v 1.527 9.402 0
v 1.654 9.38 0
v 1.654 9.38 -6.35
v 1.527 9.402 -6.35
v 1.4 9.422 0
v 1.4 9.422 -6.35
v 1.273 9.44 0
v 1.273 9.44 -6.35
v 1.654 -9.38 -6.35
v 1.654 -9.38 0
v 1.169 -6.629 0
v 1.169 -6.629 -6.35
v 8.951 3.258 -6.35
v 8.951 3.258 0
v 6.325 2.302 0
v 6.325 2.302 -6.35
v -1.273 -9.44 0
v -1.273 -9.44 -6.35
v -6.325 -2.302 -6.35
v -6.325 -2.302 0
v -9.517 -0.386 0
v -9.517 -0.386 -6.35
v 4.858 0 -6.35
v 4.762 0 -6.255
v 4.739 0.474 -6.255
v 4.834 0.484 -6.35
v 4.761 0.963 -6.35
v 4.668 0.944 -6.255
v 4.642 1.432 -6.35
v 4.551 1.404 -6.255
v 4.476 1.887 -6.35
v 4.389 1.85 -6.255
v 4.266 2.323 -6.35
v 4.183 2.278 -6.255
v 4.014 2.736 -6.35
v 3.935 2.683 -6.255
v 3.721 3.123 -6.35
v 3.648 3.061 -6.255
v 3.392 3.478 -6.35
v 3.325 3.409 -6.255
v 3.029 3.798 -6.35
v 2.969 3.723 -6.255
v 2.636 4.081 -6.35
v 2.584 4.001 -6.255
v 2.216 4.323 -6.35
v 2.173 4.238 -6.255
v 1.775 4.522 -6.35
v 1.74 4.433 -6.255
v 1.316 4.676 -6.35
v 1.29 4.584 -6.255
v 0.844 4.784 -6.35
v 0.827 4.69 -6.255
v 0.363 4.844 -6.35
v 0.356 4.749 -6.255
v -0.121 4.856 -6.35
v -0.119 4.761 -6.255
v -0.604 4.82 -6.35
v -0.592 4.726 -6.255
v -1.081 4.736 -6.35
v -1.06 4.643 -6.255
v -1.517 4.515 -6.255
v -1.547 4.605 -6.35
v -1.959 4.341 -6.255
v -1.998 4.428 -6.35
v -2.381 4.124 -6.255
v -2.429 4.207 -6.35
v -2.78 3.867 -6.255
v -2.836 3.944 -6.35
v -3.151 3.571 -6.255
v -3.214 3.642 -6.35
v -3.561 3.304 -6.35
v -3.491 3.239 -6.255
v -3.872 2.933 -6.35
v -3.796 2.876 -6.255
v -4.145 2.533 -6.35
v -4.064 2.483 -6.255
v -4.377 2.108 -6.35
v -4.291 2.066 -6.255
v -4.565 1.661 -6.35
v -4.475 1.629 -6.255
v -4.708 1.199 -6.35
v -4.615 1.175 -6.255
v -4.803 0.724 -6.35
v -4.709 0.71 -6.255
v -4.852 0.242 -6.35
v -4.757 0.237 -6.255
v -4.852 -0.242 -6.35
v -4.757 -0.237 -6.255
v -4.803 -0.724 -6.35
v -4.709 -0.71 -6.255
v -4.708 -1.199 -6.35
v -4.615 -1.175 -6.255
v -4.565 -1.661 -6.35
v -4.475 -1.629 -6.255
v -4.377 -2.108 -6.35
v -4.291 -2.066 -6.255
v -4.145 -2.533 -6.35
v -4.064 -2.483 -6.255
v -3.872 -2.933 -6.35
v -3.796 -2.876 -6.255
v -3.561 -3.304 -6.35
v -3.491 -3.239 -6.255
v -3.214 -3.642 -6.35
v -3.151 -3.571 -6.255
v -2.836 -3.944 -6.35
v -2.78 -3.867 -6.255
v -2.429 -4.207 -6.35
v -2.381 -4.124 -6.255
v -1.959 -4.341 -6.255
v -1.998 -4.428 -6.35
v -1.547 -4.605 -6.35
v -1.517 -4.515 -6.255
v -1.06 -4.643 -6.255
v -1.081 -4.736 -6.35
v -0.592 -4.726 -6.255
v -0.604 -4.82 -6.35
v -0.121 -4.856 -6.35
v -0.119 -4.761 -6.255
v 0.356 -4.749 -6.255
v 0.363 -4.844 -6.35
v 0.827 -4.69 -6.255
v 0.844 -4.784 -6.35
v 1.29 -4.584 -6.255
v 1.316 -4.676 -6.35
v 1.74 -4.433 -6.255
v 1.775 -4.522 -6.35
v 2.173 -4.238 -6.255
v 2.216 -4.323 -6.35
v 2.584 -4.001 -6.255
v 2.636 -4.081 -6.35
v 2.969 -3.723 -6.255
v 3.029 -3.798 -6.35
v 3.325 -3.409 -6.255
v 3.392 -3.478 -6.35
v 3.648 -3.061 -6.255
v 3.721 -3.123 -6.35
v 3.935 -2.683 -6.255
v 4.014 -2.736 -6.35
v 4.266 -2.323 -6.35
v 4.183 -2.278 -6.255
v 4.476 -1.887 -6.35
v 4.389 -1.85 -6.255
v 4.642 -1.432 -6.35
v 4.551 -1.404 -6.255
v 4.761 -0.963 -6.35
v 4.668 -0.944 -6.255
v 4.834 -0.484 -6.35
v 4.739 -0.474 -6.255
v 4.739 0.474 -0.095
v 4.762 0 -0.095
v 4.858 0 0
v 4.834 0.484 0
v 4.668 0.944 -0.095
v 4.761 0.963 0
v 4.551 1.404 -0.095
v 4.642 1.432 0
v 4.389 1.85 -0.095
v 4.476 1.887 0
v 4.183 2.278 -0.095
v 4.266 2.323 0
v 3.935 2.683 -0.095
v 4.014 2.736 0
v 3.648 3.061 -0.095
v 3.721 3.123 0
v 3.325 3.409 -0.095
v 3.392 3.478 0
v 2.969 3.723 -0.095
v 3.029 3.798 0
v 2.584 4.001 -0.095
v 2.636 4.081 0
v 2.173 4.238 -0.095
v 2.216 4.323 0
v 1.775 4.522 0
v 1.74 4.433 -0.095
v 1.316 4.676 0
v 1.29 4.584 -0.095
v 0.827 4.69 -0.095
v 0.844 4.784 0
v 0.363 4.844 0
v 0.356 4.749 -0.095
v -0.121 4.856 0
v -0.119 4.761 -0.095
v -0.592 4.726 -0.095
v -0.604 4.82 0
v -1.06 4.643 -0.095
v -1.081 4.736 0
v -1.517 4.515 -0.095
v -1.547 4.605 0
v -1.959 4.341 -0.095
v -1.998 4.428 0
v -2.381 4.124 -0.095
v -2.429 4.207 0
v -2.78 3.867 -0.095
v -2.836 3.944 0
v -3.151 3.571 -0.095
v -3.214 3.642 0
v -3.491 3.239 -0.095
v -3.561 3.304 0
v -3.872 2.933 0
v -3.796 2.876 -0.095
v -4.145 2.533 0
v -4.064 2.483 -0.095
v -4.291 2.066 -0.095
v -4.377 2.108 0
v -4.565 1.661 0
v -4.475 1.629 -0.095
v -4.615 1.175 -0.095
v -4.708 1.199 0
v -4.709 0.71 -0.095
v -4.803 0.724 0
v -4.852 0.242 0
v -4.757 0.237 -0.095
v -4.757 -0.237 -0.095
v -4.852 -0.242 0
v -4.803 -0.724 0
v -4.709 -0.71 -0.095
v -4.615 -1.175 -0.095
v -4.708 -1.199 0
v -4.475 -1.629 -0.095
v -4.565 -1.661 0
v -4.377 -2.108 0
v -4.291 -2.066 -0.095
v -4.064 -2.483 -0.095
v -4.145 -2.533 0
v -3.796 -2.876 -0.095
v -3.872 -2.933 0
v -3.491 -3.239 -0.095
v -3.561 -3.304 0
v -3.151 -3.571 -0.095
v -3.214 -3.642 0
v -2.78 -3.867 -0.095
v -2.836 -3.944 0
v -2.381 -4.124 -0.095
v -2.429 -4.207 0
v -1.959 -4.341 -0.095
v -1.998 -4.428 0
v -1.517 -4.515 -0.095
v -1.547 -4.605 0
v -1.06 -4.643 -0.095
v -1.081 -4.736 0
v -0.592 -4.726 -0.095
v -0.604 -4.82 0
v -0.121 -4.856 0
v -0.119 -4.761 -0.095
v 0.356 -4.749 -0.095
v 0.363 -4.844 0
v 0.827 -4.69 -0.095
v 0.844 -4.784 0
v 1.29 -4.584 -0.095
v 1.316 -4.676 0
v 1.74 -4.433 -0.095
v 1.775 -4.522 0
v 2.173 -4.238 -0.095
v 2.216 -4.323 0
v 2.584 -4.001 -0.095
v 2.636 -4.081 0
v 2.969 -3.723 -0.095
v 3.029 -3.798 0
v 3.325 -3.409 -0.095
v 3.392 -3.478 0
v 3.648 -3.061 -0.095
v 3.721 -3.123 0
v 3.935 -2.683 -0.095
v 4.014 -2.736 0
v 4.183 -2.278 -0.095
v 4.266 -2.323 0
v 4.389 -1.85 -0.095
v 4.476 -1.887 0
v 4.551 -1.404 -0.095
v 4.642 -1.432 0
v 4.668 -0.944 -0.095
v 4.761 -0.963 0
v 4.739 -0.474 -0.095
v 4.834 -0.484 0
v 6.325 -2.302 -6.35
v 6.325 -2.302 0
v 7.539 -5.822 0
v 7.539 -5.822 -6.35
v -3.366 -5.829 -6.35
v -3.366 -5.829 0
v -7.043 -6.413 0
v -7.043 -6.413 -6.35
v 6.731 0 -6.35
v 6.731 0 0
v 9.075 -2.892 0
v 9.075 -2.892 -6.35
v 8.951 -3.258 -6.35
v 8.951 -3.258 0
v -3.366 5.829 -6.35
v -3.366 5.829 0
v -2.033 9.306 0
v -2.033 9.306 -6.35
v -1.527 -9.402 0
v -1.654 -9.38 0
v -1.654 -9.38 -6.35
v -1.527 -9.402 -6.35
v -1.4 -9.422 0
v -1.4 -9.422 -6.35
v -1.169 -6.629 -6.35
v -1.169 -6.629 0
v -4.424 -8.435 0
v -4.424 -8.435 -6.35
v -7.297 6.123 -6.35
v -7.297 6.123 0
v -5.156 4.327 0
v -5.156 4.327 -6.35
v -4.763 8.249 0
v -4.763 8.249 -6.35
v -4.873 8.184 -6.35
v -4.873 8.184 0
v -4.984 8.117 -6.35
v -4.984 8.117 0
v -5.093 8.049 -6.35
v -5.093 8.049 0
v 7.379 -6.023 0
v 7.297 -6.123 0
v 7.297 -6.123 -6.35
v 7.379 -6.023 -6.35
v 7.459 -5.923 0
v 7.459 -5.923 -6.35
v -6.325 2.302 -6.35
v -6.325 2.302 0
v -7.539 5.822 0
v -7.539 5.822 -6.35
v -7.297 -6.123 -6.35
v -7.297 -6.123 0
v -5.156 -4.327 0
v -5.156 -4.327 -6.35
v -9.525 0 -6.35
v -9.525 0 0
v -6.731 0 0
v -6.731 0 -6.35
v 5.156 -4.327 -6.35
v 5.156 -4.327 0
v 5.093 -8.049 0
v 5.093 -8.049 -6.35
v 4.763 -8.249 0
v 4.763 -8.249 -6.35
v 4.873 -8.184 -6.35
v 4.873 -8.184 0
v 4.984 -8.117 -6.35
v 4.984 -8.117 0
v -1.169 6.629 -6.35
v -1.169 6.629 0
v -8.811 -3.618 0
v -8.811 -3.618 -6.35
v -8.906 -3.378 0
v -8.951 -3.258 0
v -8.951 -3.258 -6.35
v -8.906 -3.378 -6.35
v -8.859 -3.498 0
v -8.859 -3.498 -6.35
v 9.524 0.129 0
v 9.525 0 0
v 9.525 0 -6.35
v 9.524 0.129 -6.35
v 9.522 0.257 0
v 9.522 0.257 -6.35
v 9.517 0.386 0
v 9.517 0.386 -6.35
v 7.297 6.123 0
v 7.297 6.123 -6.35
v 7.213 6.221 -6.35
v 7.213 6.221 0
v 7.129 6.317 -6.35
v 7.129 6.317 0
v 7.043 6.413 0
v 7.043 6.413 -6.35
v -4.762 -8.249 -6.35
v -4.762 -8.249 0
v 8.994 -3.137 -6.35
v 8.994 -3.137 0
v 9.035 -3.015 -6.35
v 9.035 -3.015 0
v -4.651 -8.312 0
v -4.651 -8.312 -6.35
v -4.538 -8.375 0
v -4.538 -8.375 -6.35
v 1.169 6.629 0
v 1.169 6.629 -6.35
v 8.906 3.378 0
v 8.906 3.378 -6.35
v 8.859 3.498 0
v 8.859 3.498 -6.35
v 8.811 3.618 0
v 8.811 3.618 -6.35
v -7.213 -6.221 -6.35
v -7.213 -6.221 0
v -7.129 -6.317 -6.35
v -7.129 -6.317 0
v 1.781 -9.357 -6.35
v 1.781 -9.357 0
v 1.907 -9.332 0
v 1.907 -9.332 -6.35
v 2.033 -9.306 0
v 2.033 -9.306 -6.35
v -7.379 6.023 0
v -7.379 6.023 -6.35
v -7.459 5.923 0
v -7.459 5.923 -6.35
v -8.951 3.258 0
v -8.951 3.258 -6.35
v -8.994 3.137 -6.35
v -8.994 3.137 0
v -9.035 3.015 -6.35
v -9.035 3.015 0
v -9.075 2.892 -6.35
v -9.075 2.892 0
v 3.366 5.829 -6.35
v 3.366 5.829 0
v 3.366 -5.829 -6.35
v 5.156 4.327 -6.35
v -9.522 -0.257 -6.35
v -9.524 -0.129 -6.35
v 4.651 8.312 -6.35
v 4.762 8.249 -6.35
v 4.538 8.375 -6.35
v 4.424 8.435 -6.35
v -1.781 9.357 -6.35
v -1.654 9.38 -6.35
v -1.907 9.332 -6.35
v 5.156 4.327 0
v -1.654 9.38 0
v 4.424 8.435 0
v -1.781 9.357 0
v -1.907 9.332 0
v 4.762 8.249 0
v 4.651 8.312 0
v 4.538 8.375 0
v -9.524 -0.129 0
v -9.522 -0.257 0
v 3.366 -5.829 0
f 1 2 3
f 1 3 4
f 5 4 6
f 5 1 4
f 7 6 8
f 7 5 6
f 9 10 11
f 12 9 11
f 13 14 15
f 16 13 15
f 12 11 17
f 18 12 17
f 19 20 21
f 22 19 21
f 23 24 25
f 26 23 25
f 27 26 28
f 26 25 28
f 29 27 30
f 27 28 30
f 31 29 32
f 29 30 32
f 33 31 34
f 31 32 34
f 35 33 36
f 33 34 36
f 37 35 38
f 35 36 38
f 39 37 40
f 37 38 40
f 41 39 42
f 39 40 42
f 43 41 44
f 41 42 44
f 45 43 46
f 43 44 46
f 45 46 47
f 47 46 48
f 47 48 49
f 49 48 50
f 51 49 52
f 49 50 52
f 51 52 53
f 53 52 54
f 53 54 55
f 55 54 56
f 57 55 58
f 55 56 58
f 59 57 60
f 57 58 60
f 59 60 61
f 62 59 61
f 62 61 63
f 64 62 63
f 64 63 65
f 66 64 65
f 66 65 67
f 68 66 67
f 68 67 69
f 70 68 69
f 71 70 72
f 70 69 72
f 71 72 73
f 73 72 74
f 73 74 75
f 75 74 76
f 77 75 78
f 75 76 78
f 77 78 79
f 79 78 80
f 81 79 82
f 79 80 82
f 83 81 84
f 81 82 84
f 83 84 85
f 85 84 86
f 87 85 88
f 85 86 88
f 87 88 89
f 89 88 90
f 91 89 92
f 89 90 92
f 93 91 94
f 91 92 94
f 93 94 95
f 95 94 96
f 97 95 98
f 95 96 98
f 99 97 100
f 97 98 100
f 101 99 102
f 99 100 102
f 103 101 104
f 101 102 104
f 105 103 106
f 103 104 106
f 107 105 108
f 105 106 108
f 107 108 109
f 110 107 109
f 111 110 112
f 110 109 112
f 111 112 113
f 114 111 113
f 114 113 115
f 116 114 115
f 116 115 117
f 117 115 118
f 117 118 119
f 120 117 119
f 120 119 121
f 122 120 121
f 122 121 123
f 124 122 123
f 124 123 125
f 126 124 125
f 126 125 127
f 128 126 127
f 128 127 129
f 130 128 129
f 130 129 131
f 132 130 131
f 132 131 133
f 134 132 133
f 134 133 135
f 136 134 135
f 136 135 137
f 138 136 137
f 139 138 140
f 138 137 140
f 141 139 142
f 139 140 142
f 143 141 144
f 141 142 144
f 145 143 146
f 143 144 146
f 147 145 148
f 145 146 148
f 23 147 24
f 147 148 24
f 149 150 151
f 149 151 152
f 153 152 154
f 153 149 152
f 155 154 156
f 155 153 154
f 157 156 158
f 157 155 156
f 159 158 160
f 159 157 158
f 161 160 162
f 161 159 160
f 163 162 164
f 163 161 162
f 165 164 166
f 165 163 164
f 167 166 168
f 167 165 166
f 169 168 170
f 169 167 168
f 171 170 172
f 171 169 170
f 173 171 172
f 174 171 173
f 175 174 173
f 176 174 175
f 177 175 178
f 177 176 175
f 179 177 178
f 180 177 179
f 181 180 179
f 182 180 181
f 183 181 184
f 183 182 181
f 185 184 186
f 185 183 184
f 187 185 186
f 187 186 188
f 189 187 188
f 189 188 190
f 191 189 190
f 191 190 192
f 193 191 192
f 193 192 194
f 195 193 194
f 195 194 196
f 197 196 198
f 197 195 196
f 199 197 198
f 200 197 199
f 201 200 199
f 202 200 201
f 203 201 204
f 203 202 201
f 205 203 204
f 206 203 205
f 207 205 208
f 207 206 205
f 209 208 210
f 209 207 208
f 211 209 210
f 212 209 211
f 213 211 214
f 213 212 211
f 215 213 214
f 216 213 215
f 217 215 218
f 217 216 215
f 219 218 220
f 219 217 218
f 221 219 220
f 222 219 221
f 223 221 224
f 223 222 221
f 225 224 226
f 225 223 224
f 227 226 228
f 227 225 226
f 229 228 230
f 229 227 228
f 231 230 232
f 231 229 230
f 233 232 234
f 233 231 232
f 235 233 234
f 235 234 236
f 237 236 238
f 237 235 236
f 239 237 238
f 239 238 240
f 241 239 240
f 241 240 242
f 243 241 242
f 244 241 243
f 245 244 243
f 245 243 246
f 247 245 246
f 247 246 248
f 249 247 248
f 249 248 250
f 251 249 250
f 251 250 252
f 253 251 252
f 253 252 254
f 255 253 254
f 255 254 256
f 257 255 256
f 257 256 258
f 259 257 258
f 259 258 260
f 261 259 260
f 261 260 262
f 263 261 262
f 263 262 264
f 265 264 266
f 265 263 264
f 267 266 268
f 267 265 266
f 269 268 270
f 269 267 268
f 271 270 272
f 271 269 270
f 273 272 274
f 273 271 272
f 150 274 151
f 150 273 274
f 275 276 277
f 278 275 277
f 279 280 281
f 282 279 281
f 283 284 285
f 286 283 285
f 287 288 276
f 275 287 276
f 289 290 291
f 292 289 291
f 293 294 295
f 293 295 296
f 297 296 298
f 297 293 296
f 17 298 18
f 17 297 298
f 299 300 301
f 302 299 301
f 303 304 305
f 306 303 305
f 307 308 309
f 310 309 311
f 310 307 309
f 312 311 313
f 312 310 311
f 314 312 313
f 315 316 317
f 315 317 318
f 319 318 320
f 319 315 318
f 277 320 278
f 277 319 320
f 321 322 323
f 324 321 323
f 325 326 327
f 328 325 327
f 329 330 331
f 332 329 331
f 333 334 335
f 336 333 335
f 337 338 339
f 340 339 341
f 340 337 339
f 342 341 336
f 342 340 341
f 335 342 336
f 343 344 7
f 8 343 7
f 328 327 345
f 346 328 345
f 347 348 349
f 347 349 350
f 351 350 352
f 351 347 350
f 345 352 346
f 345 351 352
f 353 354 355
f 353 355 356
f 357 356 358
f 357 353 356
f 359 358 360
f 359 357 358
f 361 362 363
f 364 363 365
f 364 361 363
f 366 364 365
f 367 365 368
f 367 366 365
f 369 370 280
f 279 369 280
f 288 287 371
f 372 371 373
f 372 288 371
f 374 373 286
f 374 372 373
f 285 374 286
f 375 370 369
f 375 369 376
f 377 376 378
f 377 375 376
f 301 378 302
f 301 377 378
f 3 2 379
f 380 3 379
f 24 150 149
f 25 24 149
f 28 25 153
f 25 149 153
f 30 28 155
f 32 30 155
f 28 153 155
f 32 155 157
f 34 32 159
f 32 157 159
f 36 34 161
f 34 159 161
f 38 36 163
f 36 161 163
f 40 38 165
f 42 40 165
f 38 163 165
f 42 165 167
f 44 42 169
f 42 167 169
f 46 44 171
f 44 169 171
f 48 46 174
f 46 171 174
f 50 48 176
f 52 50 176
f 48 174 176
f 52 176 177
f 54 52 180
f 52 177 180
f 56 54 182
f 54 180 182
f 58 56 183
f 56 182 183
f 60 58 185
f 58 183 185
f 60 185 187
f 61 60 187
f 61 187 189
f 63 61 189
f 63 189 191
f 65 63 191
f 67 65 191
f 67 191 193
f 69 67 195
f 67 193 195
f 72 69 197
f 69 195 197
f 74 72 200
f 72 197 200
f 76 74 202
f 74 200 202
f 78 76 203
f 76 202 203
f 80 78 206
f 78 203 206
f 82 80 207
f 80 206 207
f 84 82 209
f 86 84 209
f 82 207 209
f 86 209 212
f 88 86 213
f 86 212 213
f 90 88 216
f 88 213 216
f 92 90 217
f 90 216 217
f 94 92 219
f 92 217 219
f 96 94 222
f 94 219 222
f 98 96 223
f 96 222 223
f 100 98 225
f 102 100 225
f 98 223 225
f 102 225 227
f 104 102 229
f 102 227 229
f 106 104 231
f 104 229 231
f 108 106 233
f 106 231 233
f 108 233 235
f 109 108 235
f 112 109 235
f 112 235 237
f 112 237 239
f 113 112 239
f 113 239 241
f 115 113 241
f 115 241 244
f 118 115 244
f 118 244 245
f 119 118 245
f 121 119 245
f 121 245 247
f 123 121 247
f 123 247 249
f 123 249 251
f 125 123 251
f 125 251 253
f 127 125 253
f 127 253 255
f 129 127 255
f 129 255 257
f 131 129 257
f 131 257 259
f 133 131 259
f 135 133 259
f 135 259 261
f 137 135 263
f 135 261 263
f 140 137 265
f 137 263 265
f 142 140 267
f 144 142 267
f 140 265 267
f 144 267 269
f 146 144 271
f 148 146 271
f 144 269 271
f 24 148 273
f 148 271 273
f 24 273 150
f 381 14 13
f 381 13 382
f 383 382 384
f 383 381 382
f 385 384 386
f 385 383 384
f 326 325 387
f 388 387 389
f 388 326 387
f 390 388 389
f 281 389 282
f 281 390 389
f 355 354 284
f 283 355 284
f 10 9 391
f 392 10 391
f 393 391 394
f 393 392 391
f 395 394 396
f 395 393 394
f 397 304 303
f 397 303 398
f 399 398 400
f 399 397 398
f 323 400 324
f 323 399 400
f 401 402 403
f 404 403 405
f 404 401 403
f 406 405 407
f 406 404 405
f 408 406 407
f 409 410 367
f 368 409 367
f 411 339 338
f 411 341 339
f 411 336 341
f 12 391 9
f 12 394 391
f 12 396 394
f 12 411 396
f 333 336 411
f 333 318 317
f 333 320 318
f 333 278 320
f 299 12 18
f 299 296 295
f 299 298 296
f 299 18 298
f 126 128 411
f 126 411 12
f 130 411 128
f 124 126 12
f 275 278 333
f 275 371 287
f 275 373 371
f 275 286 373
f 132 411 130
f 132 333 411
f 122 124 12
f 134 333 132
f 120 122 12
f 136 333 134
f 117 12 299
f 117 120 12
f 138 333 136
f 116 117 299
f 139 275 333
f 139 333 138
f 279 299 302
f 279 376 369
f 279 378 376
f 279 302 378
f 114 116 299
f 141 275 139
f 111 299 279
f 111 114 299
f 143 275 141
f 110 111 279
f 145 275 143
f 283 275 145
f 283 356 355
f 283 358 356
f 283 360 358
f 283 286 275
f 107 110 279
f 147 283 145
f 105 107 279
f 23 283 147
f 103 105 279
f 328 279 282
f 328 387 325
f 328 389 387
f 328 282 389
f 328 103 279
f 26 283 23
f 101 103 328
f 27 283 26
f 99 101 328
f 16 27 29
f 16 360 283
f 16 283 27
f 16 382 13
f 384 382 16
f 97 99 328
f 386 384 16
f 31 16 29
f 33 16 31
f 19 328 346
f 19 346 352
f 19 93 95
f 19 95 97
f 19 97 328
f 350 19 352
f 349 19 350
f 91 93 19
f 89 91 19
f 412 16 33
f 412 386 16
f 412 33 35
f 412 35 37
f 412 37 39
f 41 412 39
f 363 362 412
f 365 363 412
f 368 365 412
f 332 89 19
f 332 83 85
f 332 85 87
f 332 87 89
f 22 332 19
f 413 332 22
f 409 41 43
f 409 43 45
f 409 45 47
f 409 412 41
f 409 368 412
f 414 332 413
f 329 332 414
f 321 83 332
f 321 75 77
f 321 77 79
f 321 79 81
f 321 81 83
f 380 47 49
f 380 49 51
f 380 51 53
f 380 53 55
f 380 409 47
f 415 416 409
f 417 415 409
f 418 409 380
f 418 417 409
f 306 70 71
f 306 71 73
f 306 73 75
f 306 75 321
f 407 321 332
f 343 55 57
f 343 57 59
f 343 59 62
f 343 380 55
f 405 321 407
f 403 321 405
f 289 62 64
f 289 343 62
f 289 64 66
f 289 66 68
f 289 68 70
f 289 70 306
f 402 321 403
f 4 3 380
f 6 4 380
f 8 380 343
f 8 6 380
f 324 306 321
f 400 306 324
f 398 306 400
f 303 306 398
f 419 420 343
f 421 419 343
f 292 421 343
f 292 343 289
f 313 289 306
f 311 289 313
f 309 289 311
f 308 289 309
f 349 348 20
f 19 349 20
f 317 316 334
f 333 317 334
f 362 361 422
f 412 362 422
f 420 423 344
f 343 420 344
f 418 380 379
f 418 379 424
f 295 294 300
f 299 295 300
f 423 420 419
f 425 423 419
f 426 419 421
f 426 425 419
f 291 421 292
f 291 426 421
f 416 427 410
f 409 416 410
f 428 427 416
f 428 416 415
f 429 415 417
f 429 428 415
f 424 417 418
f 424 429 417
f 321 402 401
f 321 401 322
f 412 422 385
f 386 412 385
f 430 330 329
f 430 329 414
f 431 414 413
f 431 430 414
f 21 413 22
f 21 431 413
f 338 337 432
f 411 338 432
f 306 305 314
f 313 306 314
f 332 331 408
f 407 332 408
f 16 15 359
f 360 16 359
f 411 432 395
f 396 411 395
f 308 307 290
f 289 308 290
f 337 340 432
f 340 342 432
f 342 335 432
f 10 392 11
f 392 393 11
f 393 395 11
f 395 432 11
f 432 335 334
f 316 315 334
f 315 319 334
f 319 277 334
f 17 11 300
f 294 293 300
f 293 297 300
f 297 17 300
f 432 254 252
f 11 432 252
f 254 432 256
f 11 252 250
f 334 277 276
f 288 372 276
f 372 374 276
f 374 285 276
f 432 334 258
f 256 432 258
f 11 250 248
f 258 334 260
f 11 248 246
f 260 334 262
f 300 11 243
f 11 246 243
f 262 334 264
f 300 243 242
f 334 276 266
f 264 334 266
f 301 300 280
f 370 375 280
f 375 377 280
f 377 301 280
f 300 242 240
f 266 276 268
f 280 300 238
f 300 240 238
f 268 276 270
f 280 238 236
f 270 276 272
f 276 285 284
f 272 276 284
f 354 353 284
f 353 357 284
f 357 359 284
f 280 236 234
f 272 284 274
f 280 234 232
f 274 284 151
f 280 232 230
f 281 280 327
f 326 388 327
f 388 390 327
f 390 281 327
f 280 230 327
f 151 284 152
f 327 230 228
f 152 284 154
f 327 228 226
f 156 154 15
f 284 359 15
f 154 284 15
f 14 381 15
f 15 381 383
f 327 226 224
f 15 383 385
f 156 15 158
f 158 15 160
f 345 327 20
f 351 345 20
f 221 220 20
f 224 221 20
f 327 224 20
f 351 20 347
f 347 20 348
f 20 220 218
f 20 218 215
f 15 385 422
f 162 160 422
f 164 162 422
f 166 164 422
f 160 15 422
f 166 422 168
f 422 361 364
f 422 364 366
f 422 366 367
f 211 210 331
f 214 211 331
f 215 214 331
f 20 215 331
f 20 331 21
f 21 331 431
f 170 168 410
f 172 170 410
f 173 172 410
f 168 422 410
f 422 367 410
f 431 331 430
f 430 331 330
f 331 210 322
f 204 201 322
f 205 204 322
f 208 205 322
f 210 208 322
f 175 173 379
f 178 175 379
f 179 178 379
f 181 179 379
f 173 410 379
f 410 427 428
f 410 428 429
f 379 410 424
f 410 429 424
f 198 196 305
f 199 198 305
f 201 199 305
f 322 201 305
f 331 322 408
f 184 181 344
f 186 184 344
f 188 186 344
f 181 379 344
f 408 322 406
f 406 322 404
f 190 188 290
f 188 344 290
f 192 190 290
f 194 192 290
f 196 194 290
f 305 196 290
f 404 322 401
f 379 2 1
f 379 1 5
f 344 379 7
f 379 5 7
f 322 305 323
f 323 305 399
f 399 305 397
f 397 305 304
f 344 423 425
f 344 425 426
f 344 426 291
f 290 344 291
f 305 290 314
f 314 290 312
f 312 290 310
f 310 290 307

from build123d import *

# Parameters (mm, degrees)
SKETCH1_R               = 6.731
SKETCH1_R_2             = 4.7625
BOSS_EXTRUDE1_DEPTH     = 6.35
BOSS_EXTRUDE2_DEPTH     = 6.35
CIRPATTERN1_COUNT       = 18
CHAMFER1_SIZE           = 0.09525
SKETCH3_R               = 314.325
SKETCH3_R_2             = 9.525
CUT_EXTRUDE_THIN1_DEPTH = 16.60964661


with BuildPart() as part:
    # Sketch1 → Boss-Extrude1 (new body)
    with BuildSketch(Plane.XY):
        Circle(SKETCH1_R)
        Circle(SKETCH1_R_2, mode=Mode.SUBTRACT)
    extrude(amount=-BOSS_EXTRUDE1_DEPTH)

    # Sketch2 → Boss-Extrude2 (add)
    with BuildSketch(Plane.XY):
        with BuildLine():
            Line((-1.168825884, 6.628740986), (1.764265485, 10.005646771))
            Line((1.764265485, 10.005646771), (1.168825884, 6.628740986))
            ThreePointArc((1.168825884, 6.628740986), (0, 6.731), (-1.168825884, 6.628740986))
        make_face()
    boss_extrude2 = extrude(amount=-BOSS_EXTRUDE2_DEPTH)

    # CirPattern1: Boss-Extrude2 ×18 about axis
    cirpattern1_axis = Axis((0, 0, 0), (0, 0, 1))
    for i in range(1, CIRPATTERN1_COUNT):
        add(boss_extrude2.rotate(cirpattern1_axis, i * 360 / CIRPATTERN1_COUNT))

    # Chamfer1
    chamfer1_edges = [part.edges().sort_by_distance(p)[0] for p in [
        (-4.7625, 0, -6.35),
        (-4.7625, 0, 0),
    ]]
    chamfer(chamfer1_edges, length=CHAMFER1_SIZE)

    # Sketch3 → Cut-Extrude-Thin1 (cut, through all)
    with BuildSketch(Plane.XY):
        Circle(SKETCH3_R)
        Circle(SKETCH3_R_2, mode=Mode.SUBTRACT)
    extrude(amount=-CUT_EXTRUDE_THIN1_DEPTH, mode=Mode.SUBTRACT)


solid = part.part
